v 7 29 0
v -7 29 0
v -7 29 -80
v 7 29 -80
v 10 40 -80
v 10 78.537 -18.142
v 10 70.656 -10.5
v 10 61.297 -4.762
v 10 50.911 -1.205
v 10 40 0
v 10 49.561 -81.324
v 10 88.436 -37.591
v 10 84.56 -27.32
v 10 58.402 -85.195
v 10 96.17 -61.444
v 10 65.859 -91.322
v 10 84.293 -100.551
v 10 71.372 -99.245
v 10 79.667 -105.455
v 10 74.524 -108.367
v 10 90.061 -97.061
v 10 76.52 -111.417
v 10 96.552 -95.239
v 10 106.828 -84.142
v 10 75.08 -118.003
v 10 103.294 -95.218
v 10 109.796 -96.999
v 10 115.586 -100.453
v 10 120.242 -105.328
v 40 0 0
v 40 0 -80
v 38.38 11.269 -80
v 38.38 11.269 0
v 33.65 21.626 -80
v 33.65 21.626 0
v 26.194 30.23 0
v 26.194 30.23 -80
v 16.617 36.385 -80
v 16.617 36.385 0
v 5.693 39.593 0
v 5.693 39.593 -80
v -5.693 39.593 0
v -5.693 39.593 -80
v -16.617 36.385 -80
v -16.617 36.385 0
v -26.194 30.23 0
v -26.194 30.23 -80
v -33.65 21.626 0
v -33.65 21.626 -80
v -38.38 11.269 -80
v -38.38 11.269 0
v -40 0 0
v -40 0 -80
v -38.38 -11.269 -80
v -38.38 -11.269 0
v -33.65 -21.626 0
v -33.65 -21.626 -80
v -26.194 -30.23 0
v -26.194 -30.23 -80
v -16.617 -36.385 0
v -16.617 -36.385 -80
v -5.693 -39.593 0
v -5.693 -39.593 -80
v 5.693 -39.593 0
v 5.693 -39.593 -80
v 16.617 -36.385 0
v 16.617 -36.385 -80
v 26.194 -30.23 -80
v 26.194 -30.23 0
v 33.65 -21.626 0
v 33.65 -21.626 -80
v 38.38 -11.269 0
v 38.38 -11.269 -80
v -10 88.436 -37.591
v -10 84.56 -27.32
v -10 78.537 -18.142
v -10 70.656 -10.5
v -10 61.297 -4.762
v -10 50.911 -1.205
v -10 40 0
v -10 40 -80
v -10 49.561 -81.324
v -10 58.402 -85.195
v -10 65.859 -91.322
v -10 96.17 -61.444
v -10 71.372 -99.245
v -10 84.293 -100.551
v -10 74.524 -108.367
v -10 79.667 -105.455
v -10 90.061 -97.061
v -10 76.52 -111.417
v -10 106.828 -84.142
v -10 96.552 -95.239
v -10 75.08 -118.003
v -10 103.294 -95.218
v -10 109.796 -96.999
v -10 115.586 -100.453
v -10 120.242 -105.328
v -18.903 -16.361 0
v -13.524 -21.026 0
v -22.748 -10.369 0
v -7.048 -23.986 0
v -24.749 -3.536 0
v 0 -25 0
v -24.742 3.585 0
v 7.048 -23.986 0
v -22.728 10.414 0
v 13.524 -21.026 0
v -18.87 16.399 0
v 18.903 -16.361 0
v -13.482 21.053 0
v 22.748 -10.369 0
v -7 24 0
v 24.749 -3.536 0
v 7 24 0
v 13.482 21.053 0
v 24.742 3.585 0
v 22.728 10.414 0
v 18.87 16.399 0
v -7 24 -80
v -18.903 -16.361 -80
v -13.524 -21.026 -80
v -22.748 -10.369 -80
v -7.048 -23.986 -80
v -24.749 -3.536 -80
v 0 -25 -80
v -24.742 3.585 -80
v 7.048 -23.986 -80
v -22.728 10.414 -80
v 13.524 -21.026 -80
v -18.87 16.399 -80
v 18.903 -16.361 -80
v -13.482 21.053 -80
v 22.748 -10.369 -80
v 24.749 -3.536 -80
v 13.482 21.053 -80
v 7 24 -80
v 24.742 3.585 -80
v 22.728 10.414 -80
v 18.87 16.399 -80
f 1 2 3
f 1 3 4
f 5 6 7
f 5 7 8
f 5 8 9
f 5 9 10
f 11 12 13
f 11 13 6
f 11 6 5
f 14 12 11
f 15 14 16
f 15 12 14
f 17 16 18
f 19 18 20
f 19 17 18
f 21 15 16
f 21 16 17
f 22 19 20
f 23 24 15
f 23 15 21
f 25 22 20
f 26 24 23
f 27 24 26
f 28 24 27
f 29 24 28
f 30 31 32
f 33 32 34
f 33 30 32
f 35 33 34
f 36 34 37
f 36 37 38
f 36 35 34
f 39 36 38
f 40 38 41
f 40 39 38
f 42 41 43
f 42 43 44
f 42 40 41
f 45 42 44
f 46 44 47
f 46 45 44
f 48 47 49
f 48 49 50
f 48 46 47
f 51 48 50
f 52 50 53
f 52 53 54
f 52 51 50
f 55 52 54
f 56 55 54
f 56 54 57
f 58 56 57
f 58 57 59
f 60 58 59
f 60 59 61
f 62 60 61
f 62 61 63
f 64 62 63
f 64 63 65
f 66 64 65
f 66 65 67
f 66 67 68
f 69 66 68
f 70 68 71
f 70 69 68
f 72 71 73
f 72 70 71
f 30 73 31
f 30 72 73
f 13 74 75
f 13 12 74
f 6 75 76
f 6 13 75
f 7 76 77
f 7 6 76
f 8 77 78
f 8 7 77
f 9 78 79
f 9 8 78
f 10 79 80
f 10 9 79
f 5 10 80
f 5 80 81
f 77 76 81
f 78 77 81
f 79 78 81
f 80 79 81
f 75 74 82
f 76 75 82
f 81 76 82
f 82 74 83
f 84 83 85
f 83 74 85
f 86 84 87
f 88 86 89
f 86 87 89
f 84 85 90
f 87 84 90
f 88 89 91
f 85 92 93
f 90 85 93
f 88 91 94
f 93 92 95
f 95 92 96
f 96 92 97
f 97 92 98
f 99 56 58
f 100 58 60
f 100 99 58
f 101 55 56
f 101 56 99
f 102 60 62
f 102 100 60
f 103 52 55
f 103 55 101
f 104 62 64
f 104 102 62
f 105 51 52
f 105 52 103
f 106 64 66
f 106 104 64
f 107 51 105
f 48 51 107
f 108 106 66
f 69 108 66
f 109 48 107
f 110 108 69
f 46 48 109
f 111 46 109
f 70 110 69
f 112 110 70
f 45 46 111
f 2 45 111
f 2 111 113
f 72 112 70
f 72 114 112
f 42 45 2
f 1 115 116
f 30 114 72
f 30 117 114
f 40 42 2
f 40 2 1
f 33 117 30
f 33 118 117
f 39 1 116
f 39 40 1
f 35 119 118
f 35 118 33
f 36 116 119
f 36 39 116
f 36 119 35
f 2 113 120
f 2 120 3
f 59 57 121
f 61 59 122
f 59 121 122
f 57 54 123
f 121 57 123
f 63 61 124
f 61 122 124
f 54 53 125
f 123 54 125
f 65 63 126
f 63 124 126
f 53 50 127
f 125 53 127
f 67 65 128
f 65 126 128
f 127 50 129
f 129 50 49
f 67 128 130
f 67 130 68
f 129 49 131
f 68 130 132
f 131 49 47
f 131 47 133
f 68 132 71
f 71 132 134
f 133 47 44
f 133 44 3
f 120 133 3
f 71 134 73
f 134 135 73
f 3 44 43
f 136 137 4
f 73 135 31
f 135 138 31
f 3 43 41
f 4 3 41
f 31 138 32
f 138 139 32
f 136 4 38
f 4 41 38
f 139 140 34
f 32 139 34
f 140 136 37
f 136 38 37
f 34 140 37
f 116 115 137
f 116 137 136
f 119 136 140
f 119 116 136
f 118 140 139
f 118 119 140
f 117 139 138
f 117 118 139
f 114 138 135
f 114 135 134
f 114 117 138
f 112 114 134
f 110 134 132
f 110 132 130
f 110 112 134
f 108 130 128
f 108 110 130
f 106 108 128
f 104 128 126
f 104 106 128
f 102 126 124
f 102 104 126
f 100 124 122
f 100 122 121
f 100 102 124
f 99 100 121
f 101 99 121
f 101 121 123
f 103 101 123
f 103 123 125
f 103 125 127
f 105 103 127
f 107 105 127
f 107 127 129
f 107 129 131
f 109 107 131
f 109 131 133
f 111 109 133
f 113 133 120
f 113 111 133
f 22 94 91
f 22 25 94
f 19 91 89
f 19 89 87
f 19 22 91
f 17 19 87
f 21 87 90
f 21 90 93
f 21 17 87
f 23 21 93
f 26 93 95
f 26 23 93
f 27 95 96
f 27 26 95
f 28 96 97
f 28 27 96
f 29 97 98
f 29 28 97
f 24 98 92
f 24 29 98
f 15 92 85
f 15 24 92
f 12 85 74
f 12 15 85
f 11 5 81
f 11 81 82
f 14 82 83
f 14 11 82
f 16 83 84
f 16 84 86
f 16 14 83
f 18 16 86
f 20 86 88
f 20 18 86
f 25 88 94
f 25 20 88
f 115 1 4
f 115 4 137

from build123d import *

# Parameters (mm, degrees)
SKETCH1_R           = 40
BOSS_EXTRUDE1_DEPTH = 80
BOSS_EXTRUDE2_DEPTH = 10


with BuildPart() as part:
    # Sketch1 → Boss-Extrude1 (new body)
    with BuildSketch(Plane.XY):
        Circle(SKETCH1_R)
        with BuildLine():
            Line((-7, 29), (7, 29))
            Line((7, 29), (7, 24))
            ThreePointArc((7, 24), (0, -25), (-7, 24))
            Line((-7, 24), (-7, 29))
        make_face(mode=Mode.SUBTRACT)
    extrude(amount=-BOSS_EXTRUDE1_DEPTH)


with BuildPart() as body_2:
    # Sketch2 → Boss-Extrude2 (new, symmetric)
    with BuildSketch(Plane(origin=(0, 0, 0), x_dir=(0, 0, -1), z_dir=(1, 0, 0))):
        with BuildLine():
            ThreePointArc((37.590861727, 88.435661318), (10.500272699, 70.655693487), (0, 40))
            Line((0, 40), (80, 40))
            ThreePointArc((80, 40), (91.322065693, 65.859428989), (118.003195099, 75.079872188))
            ThreePointArc((118.003195099, 75.079872188), (95.929990804, 93.244657129), (105.328256515, 120.242034066))
            ThreePointArc((105.328256515, 120.242034066), (72.960415449, 101.142504042), (37.590861727, 88.435661318))
        make_face()
    extrude(amount=BOSS_EXTRUDE2_DEPTH, both=True)


solid = Compound([part.part, body_2.part])
